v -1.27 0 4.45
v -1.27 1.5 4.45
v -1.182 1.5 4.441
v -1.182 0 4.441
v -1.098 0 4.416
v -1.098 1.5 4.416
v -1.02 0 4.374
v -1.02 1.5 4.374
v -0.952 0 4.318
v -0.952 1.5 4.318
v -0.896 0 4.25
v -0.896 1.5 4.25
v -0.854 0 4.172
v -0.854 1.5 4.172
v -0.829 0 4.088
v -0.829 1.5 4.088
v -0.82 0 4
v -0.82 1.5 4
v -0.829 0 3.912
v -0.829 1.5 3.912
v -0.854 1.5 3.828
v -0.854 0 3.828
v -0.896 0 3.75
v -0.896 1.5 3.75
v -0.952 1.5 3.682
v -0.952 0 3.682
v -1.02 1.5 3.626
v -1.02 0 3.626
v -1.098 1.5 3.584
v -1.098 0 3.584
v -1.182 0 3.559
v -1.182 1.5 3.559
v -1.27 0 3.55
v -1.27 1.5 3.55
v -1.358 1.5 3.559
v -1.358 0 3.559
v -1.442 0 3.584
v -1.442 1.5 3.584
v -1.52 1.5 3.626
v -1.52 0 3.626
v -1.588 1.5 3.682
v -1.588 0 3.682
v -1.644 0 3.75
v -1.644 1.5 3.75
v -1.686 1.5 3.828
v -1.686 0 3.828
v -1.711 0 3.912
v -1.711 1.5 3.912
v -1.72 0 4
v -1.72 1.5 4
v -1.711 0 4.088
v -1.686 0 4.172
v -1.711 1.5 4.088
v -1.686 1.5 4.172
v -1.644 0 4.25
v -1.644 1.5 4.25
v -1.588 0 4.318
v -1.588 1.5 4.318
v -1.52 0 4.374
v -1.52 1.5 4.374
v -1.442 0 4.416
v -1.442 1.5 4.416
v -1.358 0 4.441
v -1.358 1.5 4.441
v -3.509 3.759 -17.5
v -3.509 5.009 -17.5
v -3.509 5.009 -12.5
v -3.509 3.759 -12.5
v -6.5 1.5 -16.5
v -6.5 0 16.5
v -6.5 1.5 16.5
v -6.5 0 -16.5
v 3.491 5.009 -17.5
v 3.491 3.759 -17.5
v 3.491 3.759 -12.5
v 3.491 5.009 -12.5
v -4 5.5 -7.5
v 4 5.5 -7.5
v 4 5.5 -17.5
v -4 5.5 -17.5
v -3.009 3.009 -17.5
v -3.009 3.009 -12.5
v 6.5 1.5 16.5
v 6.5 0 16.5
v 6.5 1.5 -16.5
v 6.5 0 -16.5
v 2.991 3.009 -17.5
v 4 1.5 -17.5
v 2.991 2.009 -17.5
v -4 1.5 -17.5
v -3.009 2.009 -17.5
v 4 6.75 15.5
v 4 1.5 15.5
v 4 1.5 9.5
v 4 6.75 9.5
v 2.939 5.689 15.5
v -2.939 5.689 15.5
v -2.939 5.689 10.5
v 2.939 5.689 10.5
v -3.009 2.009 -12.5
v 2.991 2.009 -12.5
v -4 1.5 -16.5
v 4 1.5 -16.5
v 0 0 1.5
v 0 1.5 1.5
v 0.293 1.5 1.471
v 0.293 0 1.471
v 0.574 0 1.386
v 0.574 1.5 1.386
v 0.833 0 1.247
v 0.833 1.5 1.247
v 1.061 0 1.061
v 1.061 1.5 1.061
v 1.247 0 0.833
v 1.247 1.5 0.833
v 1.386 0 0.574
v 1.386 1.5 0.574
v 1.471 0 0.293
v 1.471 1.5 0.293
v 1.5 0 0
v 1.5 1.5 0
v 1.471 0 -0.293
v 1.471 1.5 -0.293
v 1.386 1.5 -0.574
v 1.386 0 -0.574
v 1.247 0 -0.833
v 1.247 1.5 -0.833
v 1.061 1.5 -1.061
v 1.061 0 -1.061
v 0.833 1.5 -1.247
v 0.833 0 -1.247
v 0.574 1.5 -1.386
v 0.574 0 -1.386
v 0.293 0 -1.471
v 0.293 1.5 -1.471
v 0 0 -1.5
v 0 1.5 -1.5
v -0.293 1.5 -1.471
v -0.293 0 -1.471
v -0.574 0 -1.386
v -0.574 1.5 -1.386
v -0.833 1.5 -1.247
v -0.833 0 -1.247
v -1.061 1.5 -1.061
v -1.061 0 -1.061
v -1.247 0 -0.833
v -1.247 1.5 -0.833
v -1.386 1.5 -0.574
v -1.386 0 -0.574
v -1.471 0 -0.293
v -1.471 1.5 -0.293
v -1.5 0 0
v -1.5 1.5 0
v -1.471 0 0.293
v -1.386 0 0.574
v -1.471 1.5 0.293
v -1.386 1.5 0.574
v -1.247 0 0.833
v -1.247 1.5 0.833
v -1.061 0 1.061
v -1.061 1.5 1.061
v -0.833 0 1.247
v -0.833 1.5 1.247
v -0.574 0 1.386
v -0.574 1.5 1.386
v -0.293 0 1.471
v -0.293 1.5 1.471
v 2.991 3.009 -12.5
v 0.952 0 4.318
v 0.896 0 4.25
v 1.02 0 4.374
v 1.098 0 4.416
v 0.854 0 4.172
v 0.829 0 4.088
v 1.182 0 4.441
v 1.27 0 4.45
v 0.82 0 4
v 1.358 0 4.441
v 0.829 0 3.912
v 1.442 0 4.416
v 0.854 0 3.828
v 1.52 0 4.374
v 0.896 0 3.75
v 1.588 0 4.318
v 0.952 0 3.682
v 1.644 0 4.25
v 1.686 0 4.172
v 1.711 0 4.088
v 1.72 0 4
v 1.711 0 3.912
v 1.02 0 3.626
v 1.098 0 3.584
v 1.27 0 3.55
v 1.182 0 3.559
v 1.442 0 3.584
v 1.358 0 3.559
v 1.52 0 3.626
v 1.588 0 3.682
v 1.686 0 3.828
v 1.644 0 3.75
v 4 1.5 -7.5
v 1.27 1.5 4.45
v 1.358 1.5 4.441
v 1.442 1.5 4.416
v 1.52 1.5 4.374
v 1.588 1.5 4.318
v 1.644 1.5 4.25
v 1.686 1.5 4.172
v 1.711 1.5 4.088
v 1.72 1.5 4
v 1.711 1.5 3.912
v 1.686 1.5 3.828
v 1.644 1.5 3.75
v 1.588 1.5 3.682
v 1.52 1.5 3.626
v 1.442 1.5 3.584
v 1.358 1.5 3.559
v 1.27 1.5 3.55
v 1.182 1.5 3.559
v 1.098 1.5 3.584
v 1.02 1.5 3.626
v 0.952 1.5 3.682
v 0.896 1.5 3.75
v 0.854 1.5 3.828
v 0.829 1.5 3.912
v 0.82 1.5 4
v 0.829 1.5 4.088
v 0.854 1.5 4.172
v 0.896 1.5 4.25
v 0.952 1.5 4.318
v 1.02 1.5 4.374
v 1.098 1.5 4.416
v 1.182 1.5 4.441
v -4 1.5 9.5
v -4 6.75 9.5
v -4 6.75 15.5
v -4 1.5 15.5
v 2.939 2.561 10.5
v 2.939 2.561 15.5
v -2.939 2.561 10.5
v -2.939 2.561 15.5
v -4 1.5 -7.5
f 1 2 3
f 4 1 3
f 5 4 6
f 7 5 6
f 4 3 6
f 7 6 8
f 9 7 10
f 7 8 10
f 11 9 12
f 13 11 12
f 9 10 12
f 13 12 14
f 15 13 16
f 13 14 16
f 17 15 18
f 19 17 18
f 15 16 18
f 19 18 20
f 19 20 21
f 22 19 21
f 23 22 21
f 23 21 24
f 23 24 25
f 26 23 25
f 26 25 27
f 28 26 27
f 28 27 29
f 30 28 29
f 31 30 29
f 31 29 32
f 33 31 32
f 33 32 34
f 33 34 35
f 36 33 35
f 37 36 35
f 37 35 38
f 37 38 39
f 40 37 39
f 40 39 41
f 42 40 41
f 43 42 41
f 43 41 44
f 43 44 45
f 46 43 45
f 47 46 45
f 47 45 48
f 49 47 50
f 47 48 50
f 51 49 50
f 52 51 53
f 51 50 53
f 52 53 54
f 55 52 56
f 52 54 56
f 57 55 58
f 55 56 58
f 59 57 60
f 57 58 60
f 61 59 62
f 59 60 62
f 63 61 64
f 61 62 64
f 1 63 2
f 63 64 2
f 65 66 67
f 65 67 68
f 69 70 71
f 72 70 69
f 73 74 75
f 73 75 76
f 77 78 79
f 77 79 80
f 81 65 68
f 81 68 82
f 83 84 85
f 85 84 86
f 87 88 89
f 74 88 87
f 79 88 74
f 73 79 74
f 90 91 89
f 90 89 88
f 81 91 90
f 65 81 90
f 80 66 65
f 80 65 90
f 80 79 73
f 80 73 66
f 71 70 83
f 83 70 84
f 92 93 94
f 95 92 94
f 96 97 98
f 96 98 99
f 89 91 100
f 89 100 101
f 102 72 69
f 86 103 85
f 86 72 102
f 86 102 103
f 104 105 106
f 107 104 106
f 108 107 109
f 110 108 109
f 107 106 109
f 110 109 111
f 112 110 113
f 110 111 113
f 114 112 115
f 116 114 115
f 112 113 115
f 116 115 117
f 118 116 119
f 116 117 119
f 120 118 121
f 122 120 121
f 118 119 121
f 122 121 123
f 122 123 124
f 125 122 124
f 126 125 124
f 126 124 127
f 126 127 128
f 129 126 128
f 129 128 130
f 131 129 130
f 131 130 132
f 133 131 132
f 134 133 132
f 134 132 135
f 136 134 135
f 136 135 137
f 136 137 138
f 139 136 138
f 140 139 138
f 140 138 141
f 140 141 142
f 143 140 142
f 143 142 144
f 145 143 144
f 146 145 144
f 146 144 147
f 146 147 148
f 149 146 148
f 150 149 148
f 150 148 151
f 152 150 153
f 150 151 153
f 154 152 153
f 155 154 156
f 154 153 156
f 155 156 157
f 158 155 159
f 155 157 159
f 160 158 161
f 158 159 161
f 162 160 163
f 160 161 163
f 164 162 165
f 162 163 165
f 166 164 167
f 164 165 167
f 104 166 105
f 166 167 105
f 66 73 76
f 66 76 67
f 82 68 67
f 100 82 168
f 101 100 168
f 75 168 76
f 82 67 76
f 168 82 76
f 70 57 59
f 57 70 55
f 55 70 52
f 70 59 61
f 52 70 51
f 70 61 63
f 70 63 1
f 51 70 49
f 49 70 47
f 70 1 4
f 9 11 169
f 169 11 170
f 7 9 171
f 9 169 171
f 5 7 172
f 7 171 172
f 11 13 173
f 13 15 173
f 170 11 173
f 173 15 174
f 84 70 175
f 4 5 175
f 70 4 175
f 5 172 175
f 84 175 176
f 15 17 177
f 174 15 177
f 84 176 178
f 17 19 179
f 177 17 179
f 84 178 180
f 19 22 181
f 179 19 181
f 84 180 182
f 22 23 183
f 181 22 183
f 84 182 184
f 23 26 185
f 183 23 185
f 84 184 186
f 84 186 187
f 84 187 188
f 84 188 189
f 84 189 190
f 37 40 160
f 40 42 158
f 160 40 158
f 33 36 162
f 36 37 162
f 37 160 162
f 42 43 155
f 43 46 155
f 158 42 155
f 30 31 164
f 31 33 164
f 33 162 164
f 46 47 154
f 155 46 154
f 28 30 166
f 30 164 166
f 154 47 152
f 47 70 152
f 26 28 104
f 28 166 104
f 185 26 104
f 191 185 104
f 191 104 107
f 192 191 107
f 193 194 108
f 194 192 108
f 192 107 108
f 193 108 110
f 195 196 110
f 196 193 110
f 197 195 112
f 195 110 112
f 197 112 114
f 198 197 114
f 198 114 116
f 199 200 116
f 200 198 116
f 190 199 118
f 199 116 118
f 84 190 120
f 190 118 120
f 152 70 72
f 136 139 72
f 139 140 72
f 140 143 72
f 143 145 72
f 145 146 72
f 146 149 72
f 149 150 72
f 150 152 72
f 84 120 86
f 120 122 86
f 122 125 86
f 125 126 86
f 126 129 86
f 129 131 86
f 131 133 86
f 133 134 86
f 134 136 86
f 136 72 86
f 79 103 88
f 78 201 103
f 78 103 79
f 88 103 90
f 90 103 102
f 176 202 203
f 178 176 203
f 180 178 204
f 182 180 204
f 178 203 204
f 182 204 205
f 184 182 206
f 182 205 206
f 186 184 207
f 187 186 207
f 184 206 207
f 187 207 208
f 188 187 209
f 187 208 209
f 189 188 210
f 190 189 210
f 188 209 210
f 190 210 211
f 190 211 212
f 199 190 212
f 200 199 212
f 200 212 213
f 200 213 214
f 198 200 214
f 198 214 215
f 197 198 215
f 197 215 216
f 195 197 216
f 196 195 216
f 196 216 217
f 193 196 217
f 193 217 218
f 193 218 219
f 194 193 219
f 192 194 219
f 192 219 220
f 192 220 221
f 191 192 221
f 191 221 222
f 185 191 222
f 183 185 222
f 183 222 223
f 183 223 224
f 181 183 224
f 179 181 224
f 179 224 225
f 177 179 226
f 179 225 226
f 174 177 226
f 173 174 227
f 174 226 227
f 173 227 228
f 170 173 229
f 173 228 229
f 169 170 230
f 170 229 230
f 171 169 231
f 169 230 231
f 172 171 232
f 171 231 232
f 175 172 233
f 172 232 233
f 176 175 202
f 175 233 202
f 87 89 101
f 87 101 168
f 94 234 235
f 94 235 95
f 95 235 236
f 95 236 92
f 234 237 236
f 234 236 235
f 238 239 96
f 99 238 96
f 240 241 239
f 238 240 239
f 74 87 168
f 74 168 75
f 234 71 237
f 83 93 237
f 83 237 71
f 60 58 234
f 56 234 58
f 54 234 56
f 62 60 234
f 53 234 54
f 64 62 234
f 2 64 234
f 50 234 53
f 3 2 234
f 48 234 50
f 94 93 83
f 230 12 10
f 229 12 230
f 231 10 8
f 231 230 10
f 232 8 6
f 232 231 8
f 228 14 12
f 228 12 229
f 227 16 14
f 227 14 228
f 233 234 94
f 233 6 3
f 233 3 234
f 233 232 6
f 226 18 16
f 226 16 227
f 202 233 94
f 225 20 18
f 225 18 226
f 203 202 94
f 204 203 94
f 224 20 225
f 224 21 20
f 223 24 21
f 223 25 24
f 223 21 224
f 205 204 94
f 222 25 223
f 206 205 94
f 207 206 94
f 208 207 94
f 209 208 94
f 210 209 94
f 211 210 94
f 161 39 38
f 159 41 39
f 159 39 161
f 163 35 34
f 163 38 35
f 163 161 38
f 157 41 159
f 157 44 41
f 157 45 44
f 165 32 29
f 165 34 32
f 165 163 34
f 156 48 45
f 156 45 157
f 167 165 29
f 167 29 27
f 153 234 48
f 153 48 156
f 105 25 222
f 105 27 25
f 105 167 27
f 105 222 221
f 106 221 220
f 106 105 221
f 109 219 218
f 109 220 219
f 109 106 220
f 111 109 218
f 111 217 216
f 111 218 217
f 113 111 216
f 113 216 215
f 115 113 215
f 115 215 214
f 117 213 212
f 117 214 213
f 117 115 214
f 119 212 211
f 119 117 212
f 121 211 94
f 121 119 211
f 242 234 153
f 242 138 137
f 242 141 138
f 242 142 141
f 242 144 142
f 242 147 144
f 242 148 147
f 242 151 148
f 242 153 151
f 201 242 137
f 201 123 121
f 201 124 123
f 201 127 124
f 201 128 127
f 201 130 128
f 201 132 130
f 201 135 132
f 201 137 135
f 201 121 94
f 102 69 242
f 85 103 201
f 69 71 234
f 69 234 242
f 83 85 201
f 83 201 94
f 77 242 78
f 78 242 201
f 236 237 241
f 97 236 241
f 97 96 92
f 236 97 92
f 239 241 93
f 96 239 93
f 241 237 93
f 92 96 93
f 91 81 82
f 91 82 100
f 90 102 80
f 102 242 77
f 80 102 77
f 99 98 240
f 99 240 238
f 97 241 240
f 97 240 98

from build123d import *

# Parameters (mm, degrees)
SKETCH2_W           = 13
SKETCH2_H           = 33
BOSS_EXTRUDE1_DEPTH = 1.5
SKETCH3_W           = 8
SKETCH3_H           = 6
BOSS_EXTRUDE2_DEPTH = 5.25
SKETCH4_W           = 5.878679656
SKETCH4_H           = 3.128679656
CUT_EXTRUDE1_DEPTH  = 5
SKETCH5_R           = 1.5
CUT_EXTRUDE2_DEPTH  = 7
SKETCH6_R           = 0.45
CUT_EXTRUDE3_DEPTH  = 7
SKETCH7_W           = 8
SKETCH7_H           = 9
BOSS_EXTRUDE3_DEPTH = 4
SKETCH10_W          = 8
SKETCH10_H          = 4
BOSS_EXTRUDE5_DEPTH = 1
CUT_EXTRUDE5_DEPTH  = 5


with BuildPart() as part:
    # Sketch2 → Boss-Extrude1 (new body)
    with BuildSketch(Plane(origin=(0, 0, 0), x_dir=(1, 0, 0), z_dir=(0, 1, 0))):
        Rectangle(SKETCH2_W, SKETCH2_H)
    extrude(amount=BOSS_EXTRUDE1_DEPTH)

    # Sketch3 → Boss-Extrude2 (add)
    with BuildSketch(Plane(origin=(0, 1.5, 0), x_dir=(1, 0, 0), z_dir=(0, 1, 0))):
        with Locations((0, -12.5)):
            Rectangle(SKETCH3_W, SKETCH3_H)
    extrude(amount=BOSS_EXTRUDE2_DEPTH)

    # Sketch4 → Cut-Extrude1 (cut)
    with BuildSketch(Plane.XY.offset(15.5)):
        with Locations((0, 4.125)):
            Rectangle(SKETCH4_W, SKETCH4_H)
    extrude(amount=-CUT_EXTRUDE1_DEPTH, mode=Mode.SUBTRACT)

    # Sketch5 → Cut-Extrude2 (cut)
    with BuildSketch(Plane(origin=(0, 1.5, 0), x_dir=(1, 0, 0), z_dir=(0, 1, 0))):
        with Locations(Location((0, 0, 0), (0, 0, 270))):
            Circle(SKETCH5_R)
    extrude(amount=-CUT_EXTRUDE2_DEPTH, mode=Mode.SUBTRACT)

    # Sketch6 → Cut-Extrude3 (cut)
    with BuildSketch(Plane(origin=(0, 1.5, 0), x_dir=(1, 0, 0), z_dir=(0, 1, 0))):
        with Locations(Location((-1.27, -4, 0), (0, 0, 270))):
            Circle(SKETCH6_R)
        with Locations(Location((1.27, -4, 0), (0, 0, 270))):
            Circle(SKETCH6_R)
    extrude(amount=-CUT_EXTRUDE3_DEPTH, mode=Mode.SUBTRACT)

    # Sketch7 → Boss-Extrude3 (add)
    with BuildSketch(Plane(origin=(0, 1.5, 0), x_dir=(1, 0, 0), z_dir=(0, 1, 0))):
        with Locations((0, 12)):
            Rectangle(SKETCH7_W, SKETCH7_H)
    extrude(amount=BOSS_EXTRUDE3_DEPTH)

    # Sketch10 → Boss-Extrude5 (add)
    with BuildSketch(Plane(origin=(0, 0, -16.5), x_dir=(-1, 0, 0), z_dir=(0, 0, -1))):
        with Locations((0, 3.5)):
            Rectangle(SKETCH10_W, SKETCH10_H)
    extrude(amount=BOSS_EXTRUDE5_DEPTH)

    # Sketch12 → Cut-Extrude5 (cut)
    with BuildSketch(Plane(origin=(0, 0, -17.5), x_dir=(-1, 0, 0), z_dir=(0, 0, -1))):
        Polygon((-3.490849898, 5.00909726), (3.509150102, 5.00909726), (3.509150102, 3.75909726), (3.009150102, 3.00909726), (3.009150102, 2.00909726), (-2.990849898, 2.00909726), (-2.990849898, 3.00909726), (-3.490849898, 3.75909726), align=None)
    extrude(amount=-CUT_EXTRUDE5_DEPTH, mode=Mode.SUBTRACT)


solid = part.part
